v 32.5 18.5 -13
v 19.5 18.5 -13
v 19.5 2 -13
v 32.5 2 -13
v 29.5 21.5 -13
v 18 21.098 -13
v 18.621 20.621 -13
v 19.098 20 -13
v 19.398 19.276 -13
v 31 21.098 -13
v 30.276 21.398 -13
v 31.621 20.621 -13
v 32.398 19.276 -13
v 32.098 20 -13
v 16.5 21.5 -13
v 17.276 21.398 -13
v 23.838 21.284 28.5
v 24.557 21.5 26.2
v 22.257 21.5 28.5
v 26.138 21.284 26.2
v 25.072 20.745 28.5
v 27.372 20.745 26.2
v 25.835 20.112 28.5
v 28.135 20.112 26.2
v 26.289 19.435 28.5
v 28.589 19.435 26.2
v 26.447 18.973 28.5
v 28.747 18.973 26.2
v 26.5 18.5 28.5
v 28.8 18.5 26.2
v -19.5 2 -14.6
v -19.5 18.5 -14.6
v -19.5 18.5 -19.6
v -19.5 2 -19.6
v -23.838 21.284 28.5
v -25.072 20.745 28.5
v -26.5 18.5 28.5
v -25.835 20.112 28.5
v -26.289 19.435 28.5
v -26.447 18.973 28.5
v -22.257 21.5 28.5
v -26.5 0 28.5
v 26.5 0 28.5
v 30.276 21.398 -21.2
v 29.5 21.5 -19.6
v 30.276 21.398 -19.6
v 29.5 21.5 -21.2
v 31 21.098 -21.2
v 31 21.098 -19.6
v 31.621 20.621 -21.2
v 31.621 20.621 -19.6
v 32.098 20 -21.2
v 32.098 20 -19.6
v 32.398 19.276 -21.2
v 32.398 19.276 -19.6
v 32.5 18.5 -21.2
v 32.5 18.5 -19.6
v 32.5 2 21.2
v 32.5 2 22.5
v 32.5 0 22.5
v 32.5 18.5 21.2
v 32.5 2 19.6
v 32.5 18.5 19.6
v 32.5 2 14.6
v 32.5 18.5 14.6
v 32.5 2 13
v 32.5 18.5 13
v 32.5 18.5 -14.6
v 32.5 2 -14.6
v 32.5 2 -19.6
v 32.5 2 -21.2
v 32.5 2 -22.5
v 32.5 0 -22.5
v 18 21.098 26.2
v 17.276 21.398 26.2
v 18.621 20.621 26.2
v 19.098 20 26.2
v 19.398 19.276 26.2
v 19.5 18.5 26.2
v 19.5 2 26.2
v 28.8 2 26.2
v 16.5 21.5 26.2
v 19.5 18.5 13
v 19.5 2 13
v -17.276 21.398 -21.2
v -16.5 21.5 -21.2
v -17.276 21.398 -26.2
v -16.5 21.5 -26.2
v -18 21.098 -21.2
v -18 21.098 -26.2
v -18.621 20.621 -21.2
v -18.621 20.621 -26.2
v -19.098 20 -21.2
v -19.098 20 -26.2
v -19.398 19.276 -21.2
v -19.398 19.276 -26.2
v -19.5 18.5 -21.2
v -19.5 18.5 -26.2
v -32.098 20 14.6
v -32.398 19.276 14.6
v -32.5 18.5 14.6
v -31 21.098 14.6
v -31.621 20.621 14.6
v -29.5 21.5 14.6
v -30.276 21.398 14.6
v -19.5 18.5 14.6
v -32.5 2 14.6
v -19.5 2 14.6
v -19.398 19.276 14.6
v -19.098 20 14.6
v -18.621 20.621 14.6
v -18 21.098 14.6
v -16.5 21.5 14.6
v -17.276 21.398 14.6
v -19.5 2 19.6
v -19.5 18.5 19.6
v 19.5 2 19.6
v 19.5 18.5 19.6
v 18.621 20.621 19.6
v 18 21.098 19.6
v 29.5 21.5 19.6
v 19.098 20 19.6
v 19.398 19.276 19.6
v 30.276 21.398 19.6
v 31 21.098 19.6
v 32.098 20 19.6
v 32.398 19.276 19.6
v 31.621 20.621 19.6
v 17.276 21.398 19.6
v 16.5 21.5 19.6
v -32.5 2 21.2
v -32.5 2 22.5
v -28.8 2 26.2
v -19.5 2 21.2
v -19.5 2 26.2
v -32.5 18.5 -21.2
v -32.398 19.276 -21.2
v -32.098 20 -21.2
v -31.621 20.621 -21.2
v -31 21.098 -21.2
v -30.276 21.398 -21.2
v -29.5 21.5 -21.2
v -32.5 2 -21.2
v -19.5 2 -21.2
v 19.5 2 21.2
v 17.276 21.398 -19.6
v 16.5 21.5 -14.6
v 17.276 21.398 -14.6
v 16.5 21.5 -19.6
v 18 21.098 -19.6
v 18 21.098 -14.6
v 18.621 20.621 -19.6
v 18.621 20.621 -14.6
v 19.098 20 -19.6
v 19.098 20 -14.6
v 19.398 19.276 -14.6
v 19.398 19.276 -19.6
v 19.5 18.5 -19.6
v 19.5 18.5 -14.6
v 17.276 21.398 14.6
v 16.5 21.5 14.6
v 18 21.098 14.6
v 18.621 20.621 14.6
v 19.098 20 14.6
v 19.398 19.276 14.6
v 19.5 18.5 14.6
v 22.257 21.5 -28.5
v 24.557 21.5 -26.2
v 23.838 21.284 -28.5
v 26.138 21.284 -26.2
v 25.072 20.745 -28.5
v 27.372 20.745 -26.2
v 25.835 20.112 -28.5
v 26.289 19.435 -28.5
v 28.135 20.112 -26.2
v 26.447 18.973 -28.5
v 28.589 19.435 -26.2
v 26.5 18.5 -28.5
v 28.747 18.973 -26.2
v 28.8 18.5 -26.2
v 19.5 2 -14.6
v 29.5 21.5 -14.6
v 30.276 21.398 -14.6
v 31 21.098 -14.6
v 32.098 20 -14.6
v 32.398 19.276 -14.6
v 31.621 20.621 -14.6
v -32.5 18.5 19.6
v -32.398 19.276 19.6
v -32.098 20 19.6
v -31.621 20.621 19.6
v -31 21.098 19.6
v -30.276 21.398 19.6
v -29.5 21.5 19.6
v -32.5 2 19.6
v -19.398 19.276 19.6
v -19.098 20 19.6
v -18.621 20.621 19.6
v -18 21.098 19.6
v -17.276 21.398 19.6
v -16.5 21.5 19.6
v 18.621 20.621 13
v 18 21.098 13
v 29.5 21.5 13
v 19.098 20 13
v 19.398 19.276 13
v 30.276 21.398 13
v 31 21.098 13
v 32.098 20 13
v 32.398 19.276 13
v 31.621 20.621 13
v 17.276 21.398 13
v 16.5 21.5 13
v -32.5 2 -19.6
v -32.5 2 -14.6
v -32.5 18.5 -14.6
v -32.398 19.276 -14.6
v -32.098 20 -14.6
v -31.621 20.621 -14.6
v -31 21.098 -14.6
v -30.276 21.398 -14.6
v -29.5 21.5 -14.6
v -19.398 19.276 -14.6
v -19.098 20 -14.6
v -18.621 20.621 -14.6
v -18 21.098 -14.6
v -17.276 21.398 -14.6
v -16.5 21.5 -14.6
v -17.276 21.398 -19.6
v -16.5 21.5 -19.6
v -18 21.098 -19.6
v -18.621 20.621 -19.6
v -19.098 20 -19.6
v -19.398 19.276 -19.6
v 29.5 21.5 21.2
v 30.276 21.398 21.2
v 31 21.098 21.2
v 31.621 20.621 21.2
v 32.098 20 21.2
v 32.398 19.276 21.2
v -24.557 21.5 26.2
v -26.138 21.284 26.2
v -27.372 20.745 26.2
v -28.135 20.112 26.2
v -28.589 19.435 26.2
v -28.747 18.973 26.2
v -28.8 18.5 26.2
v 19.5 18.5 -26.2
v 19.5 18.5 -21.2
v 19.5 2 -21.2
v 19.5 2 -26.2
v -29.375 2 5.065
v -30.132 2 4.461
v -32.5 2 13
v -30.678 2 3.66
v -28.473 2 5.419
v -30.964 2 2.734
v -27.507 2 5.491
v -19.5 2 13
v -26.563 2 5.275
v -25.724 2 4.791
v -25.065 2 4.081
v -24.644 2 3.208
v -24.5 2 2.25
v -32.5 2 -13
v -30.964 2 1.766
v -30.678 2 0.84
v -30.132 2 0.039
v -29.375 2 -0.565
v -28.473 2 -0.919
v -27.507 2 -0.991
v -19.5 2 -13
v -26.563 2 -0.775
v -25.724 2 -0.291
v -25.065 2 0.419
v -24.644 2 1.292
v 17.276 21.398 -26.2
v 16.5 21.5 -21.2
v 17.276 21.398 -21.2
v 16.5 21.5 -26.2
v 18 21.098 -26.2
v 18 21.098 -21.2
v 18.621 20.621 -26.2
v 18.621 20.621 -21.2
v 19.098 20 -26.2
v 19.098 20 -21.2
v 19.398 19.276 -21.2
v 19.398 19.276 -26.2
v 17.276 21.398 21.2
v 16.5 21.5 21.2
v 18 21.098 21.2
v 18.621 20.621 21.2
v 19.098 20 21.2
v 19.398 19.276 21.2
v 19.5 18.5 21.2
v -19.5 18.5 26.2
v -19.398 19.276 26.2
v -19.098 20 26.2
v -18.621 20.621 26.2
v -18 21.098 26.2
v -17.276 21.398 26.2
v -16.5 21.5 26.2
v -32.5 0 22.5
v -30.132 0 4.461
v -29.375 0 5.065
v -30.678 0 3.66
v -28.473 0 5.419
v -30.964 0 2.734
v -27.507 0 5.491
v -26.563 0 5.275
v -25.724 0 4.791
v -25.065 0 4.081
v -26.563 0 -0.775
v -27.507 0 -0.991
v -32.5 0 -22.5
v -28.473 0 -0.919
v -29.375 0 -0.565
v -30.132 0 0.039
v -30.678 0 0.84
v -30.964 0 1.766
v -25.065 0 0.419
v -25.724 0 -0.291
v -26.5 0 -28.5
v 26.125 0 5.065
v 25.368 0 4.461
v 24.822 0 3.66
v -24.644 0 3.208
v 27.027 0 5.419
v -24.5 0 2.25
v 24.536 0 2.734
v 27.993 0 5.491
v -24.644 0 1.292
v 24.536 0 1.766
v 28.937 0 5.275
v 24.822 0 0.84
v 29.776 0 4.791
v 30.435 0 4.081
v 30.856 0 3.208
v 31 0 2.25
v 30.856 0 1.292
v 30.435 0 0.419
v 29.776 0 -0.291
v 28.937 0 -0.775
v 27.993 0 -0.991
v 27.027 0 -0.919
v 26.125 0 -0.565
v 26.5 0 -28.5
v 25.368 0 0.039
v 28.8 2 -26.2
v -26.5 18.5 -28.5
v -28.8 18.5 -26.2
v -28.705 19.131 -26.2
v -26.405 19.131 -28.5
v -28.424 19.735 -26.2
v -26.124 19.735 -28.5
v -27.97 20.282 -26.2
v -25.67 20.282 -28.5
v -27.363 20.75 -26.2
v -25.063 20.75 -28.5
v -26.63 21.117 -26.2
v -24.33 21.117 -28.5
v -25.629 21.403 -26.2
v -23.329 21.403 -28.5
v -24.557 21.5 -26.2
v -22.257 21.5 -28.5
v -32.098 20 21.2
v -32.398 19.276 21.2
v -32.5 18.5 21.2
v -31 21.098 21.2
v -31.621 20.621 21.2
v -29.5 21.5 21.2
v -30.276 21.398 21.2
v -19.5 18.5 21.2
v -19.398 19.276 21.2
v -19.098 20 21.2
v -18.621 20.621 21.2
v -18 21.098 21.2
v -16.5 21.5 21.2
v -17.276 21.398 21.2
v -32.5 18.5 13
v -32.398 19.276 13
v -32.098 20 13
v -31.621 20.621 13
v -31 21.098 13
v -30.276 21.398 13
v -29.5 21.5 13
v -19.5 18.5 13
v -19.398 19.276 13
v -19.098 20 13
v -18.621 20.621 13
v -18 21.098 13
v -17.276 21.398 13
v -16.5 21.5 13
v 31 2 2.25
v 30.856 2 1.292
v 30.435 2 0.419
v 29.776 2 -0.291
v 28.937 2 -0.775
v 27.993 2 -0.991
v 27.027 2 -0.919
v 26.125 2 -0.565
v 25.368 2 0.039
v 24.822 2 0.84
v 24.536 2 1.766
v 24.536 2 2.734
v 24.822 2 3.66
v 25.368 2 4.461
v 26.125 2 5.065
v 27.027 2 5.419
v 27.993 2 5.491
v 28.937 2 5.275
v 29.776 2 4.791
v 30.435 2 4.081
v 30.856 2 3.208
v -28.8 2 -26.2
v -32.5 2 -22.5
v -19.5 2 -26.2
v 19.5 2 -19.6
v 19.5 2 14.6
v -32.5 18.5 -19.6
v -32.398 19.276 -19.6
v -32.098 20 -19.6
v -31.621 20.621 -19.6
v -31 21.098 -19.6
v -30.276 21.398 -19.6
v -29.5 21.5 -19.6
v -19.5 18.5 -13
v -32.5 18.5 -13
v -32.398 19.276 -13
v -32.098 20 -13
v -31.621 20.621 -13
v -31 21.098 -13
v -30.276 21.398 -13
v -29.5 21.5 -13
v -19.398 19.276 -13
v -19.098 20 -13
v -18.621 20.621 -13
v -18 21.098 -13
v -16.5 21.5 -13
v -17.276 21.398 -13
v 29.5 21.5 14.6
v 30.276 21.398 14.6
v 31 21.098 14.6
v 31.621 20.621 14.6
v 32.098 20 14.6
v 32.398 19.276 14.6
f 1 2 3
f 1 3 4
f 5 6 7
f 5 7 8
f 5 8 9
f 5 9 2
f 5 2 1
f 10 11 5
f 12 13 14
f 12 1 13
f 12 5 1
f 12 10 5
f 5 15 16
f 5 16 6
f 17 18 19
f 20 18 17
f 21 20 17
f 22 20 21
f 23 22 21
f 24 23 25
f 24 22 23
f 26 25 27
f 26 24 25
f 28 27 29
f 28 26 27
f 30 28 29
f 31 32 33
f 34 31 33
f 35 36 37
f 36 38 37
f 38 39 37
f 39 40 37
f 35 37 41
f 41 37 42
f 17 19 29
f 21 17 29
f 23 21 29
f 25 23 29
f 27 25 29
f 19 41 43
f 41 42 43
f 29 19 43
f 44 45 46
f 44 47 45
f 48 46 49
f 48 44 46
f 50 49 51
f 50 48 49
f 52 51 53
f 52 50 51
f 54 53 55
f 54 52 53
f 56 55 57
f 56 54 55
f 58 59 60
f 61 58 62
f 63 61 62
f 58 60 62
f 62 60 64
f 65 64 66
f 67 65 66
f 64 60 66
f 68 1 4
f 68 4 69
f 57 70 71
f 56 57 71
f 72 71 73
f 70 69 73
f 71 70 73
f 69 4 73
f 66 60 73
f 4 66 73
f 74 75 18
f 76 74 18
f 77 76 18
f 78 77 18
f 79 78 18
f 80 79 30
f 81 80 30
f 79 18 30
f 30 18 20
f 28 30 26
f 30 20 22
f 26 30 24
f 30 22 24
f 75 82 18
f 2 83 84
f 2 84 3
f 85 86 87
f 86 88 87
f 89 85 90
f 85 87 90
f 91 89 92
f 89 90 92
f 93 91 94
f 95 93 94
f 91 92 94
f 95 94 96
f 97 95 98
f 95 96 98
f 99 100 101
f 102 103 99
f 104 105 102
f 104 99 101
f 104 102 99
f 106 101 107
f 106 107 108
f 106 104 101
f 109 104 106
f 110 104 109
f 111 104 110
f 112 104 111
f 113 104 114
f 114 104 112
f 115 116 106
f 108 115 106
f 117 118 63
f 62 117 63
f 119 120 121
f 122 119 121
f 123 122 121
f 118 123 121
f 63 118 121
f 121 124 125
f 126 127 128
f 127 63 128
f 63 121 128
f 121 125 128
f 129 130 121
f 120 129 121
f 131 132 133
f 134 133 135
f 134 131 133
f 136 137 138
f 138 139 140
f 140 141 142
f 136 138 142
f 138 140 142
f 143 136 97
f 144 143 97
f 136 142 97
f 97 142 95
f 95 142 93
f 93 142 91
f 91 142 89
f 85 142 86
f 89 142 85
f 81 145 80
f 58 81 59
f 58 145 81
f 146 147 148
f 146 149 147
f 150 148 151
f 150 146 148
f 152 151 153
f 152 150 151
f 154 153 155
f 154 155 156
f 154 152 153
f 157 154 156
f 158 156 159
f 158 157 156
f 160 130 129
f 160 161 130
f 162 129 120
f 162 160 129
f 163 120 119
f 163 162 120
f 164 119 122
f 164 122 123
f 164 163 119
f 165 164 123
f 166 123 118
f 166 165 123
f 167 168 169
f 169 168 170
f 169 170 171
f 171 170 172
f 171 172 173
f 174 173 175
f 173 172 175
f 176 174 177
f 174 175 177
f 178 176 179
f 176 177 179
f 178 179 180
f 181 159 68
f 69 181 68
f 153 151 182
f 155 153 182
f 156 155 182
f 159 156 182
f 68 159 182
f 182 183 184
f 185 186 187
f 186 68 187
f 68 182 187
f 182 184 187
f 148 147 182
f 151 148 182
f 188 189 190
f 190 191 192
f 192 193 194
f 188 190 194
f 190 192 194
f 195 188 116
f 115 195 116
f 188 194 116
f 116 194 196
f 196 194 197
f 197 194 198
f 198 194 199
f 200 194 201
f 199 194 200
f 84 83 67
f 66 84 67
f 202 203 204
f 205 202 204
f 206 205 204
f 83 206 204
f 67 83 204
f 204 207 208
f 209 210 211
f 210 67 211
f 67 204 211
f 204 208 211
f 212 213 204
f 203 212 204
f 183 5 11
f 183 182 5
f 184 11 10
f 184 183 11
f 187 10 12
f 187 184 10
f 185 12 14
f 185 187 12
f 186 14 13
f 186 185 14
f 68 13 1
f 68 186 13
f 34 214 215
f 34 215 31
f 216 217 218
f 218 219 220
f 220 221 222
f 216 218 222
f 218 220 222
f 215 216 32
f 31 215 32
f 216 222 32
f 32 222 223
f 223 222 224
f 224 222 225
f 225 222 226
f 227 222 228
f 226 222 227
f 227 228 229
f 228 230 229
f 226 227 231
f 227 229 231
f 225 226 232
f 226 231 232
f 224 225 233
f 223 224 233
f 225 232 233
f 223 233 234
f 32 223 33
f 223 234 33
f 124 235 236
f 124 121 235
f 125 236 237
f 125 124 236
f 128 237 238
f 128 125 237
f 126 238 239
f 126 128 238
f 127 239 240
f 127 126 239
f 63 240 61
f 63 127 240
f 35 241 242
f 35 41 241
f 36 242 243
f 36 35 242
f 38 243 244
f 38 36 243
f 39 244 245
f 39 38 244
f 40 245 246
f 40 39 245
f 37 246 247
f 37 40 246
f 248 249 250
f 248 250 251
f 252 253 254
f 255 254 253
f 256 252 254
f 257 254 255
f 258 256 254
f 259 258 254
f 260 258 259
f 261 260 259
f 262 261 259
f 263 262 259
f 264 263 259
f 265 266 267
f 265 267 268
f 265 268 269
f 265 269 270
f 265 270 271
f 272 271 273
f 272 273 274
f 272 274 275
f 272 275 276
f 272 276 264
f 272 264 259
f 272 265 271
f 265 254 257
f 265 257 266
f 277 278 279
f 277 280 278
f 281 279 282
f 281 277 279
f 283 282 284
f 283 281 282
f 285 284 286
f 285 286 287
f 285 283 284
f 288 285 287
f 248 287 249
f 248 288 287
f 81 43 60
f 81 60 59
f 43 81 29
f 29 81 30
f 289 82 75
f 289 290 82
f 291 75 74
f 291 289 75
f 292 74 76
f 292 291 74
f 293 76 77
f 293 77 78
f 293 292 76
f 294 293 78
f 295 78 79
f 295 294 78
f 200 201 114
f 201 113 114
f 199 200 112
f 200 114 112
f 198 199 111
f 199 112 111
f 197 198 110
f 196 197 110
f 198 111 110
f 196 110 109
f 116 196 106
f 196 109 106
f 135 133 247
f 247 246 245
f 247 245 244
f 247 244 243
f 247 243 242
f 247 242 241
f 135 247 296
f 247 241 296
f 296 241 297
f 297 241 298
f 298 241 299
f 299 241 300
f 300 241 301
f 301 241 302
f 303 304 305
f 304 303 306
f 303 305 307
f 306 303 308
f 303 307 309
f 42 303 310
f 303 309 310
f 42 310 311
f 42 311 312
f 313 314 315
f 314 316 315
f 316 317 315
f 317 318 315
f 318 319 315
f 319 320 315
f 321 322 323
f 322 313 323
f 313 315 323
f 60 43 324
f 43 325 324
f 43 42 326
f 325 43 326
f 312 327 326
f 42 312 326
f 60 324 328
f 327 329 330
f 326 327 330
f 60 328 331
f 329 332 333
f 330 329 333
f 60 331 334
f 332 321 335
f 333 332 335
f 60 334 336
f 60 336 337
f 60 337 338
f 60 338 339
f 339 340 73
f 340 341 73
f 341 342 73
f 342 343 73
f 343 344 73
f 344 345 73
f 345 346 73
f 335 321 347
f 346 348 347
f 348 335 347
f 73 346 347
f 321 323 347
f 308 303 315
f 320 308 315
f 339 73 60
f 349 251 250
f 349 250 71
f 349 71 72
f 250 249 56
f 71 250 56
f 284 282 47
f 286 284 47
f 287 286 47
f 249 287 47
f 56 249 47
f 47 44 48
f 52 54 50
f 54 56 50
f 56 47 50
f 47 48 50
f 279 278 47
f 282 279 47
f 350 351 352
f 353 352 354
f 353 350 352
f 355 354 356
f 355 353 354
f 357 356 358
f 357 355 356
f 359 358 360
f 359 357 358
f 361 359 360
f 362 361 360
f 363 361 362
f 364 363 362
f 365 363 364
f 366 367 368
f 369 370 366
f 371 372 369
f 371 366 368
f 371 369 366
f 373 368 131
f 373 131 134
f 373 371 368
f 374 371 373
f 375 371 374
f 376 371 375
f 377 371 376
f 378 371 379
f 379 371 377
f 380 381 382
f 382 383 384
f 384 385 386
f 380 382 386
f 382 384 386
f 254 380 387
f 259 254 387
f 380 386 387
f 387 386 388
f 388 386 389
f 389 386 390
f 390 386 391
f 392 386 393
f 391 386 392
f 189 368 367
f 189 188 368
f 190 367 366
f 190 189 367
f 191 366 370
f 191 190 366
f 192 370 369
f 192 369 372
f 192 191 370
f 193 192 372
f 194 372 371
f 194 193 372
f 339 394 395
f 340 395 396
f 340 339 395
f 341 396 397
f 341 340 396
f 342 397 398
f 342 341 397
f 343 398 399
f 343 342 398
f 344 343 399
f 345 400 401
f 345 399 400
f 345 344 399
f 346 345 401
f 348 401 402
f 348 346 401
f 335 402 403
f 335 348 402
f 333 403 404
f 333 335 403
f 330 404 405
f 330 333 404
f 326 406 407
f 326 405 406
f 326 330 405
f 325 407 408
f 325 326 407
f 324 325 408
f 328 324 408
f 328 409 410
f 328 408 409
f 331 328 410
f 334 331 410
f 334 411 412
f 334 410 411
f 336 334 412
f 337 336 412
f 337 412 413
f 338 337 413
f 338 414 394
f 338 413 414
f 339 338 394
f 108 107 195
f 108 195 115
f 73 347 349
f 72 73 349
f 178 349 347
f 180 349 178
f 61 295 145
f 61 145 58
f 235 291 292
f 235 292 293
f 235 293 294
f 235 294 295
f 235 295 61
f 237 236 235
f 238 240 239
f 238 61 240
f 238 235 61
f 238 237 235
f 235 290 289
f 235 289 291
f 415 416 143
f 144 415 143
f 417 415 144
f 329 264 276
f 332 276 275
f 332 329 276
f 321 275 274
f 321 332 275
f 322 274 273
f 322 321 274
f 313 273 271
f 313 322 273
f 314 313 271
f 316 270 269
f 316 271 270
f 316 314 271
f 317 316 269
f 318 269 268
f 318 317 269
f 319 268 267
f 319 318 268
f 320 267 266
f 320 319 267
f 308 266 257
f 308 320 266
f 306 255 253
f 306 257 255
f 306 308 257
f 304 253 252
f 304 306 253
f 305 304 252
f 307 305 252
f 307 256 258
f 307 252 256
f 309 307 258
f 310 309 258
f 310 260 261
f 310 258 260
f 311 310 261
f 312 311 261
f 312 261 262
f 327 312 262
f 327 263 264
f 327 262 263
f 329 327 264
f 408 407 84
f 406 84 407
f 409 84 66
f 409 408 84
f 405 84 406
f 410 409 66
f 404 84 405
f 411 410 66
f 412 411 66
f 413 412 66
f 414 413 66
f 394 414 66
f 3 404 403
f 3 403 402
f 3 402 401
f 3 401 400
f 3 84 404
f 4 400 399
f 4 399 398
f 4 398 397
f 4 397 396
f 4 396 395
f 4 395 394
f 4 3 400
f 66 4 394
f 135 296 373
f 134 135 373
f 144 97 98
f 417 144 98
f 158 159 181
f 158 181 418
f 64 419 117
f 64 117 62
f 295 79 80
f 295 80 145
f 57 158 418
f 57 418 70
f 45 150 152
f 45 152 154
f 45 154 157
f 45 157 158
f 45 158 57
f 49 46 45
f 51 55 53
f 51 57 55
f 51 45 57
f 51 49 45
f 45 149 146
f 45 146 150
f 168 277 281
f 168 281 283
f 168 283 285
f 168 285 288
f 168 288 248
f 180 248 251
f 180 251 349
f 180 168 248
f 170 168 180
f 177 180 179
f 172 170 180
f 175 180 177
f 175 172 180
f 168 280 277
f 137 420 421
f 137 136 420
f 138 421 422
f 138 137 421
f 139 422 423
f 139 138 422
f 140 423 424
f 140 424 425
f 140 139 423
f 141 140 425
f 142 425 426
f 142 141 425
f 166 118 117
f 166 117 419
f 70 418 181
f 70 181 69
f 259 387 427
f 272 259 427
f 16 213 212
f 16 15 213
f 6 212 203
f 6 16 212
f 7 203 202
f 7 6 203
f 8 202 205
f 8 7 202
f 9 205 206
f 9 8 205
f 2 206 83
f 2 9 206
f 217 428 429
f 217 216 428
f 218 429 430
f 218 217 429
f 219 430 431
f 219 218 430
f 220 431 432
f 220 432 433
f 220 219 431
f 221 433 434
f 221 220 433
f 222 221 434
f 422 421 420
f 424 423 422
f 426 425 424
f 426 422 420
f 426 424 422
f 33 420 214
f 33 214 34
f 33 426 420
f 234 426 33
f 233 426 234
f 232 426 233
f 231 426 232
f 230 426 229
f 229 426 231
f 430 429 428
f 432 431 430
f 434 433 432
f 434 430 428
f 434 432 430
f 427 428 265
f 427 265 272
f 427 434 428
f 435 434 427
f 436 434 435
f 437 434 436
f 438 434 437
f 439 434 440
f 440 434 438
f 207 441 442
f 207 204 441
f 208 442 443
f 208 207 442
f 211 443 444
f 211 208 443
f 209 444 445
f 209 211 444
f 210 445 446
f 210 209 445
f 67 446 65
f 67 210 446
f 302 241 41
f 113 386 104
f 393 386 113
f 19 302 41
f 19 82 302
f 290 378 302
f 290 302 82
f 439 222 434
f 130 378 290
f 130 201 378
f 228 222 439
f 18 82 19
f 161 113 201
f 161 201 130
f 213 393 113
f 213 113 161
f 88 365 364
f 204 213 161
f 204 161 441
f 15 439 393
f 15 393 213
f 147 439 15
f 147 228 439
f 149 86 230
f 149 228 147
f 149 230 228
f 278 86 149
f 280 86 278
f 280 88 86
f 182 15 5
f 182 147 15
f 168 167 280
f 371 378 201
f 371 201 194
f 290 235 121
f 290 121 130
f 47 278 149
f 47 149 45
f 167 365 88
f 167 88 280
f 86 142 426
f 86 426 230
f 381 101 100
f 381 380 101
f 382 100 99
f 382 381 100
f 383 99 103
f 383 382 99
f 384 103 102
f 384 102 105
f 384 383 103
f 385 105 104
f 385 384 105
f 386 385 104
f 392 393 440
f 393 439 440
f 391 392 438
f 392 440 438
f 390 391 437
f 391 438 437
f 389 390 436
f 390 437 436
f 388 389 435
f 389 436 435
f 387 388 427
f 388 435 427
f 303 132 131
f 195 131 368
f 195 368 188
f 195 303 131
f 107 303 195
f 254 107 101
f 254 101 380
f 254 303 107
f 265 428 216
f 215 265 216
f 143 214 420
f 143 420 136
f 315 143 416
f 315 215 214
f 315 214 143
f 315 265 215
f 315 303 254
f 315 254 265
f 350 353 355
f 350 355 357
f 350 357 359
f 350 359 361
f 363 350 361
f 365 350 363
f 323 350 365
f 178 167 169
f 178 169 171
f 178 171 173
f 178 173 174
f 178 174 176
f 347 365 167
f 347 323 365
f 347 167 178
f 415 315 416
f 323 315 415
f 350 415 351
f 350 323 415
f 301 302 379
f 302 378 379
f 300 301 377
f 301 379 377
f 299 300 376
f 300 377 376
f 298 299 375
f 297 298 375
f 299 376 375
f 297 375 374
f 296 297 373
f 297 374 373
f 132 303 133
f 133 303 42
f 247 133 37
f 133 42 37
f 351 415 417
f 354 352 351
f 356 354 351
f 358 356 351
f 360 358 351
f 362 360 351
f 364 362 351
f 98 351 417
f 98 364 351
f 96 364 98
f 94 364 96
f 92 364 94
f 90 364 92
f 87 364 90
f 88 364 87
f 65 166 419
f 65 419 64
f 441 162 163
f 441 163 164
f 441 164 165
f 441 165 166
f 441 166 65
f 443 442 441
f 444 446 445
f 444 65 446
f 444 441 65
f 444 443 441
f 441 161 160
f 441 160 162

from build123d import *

# Parameters (mm, degrees)
SKETCH1_W           = 65
SKETCH1_H           = 57
SKETCH1_R           = 3.25
BOSS_EXTRUDE1_DEPTH = 21.5
CHAMFER1_SIZE       = 6
SKETCH2_W           = 13
SKETCH2_H           = 26
SKETCH2_H_2         = 5
CUT_EXTRUDE1_DEPTH  = 19.5
FILLET1_R           = 3


with BuildPart() as part:
    # Sketch1 → Boss-Extrude1 (new body)
    with BuildSketch(Plane(origin=(0, 0, 0), x_dir=(1, 0, 0), z_dir=(0, 1, 0))):
        Rectangle(SKETCH1_W, SKETCH1_H)
        with Locations((27.75, -2.25)):
            Circle(SKETCH1_R, mode=Mode.SUBTRACT)
        with Locations((-27.75, -2.25)):
            Circle(SKETCH1_R, mode=Mode.SUBTRACT)
    extrude(amount=BOSS_EXTRUDE1_DEPTH)

    # Chamfer1
    chamfer1_edges = [part.edges().sort_by_distance(p)[0] for p in [
        (32.5, 10.75, 28.5),
        (-32.5, 10.75, 28.5),
        (-32.5, 10.75, -28.5),
        (32.5, 10.75, -28.5),
    ]]
    chamfer(chamfer1_edges, length=CHAMFER1_SIZE)

    # Sketch2 → Cut-Extrude1 (cut)
    with BuildSketch(Plane(origin=(0, 21.5, 0), x_dir=(1, 0, 0), z_dir=(0, 1, 0))):
        with Locations((-26, 0)):
            Rectangle(SKETCH2_W, SKETCH2_H)
        with Locations((-26, 17.1)):
            Rectangle(SKETCH2_W, SKETCH2_H_2)
        with Locations((-26, 23.7)):
            Rectangle(SKETCH2_W, SKETCH2_H_2)
        with Locations((-26, -17.1)):
            Rectangle(SKETCH2_W, SKETCH2_H_2)
        with Locations((-26, -23.7)):
            Rectangle(SKETCH2_W, SKETCH2_H_2)
        with Locations((26, -23.7)):
            Rectangle(SKETCH2_W, SKETCH2_H_2)
        with Locations((26, -17.1)):
            Rectangle(SKETCH2_W, SKETCH2_H_2)
        with Locations((26, 0)):
            Rectangle(SKETCH2_W, SKETCH2_H)
        with Locations((26, 17.1)):
            Rectangle(SKETCH2_W, SKETCH2_H_2)
        with Locations((26, 23.7)):
            Rectangle(SKETCH2_W, SKETCH2_H_2)
    extrude(amount=-CUT_EXTRUDE1_DEPTH, mode=Mode.SUBTRACT)

    # Fillet1
    fillet1_edges = [part.edges().sort_by_distance(p)[0] for p in [
        (-19.5, 21.5, 17.1),
        (-19.5, 21.5, 23.7),
        (19.5, 21.5, 23.7),
        (19.5, 21.5, 17.1),
        (19.5, 21.5, 0),
        (19.5, 21.5, -17.1),
        (19.5, 21.5, -23.7),
        (-19.5, 21.5, 0),
        (-27.65, 21.5, -27.35),
        (27.65, 21.5, 27.35),
        (-27.65, 21.5, 27.35),
        (27.65, 21.5, -27.35),
        (-32.5, 21.5, -20.4),
        (-32.5, 21.5, -13.8),
        (-32.5, 21.5, 13.8),
        (-32.5, 21.5, 20.4),
        (32.5, 21.5, 20.4),
        (32.5, 21.5, 13.8),
        (32.5, 21.5, -13.8),
        (32.5, 21.5, -20.4),
        (-19.5, 21.5, -17.1),
        (-19.5, 21.5, -23.7),
    ]]
    fillet(fillet1_edges, radius=FILLET1_R)


solid = part.part
